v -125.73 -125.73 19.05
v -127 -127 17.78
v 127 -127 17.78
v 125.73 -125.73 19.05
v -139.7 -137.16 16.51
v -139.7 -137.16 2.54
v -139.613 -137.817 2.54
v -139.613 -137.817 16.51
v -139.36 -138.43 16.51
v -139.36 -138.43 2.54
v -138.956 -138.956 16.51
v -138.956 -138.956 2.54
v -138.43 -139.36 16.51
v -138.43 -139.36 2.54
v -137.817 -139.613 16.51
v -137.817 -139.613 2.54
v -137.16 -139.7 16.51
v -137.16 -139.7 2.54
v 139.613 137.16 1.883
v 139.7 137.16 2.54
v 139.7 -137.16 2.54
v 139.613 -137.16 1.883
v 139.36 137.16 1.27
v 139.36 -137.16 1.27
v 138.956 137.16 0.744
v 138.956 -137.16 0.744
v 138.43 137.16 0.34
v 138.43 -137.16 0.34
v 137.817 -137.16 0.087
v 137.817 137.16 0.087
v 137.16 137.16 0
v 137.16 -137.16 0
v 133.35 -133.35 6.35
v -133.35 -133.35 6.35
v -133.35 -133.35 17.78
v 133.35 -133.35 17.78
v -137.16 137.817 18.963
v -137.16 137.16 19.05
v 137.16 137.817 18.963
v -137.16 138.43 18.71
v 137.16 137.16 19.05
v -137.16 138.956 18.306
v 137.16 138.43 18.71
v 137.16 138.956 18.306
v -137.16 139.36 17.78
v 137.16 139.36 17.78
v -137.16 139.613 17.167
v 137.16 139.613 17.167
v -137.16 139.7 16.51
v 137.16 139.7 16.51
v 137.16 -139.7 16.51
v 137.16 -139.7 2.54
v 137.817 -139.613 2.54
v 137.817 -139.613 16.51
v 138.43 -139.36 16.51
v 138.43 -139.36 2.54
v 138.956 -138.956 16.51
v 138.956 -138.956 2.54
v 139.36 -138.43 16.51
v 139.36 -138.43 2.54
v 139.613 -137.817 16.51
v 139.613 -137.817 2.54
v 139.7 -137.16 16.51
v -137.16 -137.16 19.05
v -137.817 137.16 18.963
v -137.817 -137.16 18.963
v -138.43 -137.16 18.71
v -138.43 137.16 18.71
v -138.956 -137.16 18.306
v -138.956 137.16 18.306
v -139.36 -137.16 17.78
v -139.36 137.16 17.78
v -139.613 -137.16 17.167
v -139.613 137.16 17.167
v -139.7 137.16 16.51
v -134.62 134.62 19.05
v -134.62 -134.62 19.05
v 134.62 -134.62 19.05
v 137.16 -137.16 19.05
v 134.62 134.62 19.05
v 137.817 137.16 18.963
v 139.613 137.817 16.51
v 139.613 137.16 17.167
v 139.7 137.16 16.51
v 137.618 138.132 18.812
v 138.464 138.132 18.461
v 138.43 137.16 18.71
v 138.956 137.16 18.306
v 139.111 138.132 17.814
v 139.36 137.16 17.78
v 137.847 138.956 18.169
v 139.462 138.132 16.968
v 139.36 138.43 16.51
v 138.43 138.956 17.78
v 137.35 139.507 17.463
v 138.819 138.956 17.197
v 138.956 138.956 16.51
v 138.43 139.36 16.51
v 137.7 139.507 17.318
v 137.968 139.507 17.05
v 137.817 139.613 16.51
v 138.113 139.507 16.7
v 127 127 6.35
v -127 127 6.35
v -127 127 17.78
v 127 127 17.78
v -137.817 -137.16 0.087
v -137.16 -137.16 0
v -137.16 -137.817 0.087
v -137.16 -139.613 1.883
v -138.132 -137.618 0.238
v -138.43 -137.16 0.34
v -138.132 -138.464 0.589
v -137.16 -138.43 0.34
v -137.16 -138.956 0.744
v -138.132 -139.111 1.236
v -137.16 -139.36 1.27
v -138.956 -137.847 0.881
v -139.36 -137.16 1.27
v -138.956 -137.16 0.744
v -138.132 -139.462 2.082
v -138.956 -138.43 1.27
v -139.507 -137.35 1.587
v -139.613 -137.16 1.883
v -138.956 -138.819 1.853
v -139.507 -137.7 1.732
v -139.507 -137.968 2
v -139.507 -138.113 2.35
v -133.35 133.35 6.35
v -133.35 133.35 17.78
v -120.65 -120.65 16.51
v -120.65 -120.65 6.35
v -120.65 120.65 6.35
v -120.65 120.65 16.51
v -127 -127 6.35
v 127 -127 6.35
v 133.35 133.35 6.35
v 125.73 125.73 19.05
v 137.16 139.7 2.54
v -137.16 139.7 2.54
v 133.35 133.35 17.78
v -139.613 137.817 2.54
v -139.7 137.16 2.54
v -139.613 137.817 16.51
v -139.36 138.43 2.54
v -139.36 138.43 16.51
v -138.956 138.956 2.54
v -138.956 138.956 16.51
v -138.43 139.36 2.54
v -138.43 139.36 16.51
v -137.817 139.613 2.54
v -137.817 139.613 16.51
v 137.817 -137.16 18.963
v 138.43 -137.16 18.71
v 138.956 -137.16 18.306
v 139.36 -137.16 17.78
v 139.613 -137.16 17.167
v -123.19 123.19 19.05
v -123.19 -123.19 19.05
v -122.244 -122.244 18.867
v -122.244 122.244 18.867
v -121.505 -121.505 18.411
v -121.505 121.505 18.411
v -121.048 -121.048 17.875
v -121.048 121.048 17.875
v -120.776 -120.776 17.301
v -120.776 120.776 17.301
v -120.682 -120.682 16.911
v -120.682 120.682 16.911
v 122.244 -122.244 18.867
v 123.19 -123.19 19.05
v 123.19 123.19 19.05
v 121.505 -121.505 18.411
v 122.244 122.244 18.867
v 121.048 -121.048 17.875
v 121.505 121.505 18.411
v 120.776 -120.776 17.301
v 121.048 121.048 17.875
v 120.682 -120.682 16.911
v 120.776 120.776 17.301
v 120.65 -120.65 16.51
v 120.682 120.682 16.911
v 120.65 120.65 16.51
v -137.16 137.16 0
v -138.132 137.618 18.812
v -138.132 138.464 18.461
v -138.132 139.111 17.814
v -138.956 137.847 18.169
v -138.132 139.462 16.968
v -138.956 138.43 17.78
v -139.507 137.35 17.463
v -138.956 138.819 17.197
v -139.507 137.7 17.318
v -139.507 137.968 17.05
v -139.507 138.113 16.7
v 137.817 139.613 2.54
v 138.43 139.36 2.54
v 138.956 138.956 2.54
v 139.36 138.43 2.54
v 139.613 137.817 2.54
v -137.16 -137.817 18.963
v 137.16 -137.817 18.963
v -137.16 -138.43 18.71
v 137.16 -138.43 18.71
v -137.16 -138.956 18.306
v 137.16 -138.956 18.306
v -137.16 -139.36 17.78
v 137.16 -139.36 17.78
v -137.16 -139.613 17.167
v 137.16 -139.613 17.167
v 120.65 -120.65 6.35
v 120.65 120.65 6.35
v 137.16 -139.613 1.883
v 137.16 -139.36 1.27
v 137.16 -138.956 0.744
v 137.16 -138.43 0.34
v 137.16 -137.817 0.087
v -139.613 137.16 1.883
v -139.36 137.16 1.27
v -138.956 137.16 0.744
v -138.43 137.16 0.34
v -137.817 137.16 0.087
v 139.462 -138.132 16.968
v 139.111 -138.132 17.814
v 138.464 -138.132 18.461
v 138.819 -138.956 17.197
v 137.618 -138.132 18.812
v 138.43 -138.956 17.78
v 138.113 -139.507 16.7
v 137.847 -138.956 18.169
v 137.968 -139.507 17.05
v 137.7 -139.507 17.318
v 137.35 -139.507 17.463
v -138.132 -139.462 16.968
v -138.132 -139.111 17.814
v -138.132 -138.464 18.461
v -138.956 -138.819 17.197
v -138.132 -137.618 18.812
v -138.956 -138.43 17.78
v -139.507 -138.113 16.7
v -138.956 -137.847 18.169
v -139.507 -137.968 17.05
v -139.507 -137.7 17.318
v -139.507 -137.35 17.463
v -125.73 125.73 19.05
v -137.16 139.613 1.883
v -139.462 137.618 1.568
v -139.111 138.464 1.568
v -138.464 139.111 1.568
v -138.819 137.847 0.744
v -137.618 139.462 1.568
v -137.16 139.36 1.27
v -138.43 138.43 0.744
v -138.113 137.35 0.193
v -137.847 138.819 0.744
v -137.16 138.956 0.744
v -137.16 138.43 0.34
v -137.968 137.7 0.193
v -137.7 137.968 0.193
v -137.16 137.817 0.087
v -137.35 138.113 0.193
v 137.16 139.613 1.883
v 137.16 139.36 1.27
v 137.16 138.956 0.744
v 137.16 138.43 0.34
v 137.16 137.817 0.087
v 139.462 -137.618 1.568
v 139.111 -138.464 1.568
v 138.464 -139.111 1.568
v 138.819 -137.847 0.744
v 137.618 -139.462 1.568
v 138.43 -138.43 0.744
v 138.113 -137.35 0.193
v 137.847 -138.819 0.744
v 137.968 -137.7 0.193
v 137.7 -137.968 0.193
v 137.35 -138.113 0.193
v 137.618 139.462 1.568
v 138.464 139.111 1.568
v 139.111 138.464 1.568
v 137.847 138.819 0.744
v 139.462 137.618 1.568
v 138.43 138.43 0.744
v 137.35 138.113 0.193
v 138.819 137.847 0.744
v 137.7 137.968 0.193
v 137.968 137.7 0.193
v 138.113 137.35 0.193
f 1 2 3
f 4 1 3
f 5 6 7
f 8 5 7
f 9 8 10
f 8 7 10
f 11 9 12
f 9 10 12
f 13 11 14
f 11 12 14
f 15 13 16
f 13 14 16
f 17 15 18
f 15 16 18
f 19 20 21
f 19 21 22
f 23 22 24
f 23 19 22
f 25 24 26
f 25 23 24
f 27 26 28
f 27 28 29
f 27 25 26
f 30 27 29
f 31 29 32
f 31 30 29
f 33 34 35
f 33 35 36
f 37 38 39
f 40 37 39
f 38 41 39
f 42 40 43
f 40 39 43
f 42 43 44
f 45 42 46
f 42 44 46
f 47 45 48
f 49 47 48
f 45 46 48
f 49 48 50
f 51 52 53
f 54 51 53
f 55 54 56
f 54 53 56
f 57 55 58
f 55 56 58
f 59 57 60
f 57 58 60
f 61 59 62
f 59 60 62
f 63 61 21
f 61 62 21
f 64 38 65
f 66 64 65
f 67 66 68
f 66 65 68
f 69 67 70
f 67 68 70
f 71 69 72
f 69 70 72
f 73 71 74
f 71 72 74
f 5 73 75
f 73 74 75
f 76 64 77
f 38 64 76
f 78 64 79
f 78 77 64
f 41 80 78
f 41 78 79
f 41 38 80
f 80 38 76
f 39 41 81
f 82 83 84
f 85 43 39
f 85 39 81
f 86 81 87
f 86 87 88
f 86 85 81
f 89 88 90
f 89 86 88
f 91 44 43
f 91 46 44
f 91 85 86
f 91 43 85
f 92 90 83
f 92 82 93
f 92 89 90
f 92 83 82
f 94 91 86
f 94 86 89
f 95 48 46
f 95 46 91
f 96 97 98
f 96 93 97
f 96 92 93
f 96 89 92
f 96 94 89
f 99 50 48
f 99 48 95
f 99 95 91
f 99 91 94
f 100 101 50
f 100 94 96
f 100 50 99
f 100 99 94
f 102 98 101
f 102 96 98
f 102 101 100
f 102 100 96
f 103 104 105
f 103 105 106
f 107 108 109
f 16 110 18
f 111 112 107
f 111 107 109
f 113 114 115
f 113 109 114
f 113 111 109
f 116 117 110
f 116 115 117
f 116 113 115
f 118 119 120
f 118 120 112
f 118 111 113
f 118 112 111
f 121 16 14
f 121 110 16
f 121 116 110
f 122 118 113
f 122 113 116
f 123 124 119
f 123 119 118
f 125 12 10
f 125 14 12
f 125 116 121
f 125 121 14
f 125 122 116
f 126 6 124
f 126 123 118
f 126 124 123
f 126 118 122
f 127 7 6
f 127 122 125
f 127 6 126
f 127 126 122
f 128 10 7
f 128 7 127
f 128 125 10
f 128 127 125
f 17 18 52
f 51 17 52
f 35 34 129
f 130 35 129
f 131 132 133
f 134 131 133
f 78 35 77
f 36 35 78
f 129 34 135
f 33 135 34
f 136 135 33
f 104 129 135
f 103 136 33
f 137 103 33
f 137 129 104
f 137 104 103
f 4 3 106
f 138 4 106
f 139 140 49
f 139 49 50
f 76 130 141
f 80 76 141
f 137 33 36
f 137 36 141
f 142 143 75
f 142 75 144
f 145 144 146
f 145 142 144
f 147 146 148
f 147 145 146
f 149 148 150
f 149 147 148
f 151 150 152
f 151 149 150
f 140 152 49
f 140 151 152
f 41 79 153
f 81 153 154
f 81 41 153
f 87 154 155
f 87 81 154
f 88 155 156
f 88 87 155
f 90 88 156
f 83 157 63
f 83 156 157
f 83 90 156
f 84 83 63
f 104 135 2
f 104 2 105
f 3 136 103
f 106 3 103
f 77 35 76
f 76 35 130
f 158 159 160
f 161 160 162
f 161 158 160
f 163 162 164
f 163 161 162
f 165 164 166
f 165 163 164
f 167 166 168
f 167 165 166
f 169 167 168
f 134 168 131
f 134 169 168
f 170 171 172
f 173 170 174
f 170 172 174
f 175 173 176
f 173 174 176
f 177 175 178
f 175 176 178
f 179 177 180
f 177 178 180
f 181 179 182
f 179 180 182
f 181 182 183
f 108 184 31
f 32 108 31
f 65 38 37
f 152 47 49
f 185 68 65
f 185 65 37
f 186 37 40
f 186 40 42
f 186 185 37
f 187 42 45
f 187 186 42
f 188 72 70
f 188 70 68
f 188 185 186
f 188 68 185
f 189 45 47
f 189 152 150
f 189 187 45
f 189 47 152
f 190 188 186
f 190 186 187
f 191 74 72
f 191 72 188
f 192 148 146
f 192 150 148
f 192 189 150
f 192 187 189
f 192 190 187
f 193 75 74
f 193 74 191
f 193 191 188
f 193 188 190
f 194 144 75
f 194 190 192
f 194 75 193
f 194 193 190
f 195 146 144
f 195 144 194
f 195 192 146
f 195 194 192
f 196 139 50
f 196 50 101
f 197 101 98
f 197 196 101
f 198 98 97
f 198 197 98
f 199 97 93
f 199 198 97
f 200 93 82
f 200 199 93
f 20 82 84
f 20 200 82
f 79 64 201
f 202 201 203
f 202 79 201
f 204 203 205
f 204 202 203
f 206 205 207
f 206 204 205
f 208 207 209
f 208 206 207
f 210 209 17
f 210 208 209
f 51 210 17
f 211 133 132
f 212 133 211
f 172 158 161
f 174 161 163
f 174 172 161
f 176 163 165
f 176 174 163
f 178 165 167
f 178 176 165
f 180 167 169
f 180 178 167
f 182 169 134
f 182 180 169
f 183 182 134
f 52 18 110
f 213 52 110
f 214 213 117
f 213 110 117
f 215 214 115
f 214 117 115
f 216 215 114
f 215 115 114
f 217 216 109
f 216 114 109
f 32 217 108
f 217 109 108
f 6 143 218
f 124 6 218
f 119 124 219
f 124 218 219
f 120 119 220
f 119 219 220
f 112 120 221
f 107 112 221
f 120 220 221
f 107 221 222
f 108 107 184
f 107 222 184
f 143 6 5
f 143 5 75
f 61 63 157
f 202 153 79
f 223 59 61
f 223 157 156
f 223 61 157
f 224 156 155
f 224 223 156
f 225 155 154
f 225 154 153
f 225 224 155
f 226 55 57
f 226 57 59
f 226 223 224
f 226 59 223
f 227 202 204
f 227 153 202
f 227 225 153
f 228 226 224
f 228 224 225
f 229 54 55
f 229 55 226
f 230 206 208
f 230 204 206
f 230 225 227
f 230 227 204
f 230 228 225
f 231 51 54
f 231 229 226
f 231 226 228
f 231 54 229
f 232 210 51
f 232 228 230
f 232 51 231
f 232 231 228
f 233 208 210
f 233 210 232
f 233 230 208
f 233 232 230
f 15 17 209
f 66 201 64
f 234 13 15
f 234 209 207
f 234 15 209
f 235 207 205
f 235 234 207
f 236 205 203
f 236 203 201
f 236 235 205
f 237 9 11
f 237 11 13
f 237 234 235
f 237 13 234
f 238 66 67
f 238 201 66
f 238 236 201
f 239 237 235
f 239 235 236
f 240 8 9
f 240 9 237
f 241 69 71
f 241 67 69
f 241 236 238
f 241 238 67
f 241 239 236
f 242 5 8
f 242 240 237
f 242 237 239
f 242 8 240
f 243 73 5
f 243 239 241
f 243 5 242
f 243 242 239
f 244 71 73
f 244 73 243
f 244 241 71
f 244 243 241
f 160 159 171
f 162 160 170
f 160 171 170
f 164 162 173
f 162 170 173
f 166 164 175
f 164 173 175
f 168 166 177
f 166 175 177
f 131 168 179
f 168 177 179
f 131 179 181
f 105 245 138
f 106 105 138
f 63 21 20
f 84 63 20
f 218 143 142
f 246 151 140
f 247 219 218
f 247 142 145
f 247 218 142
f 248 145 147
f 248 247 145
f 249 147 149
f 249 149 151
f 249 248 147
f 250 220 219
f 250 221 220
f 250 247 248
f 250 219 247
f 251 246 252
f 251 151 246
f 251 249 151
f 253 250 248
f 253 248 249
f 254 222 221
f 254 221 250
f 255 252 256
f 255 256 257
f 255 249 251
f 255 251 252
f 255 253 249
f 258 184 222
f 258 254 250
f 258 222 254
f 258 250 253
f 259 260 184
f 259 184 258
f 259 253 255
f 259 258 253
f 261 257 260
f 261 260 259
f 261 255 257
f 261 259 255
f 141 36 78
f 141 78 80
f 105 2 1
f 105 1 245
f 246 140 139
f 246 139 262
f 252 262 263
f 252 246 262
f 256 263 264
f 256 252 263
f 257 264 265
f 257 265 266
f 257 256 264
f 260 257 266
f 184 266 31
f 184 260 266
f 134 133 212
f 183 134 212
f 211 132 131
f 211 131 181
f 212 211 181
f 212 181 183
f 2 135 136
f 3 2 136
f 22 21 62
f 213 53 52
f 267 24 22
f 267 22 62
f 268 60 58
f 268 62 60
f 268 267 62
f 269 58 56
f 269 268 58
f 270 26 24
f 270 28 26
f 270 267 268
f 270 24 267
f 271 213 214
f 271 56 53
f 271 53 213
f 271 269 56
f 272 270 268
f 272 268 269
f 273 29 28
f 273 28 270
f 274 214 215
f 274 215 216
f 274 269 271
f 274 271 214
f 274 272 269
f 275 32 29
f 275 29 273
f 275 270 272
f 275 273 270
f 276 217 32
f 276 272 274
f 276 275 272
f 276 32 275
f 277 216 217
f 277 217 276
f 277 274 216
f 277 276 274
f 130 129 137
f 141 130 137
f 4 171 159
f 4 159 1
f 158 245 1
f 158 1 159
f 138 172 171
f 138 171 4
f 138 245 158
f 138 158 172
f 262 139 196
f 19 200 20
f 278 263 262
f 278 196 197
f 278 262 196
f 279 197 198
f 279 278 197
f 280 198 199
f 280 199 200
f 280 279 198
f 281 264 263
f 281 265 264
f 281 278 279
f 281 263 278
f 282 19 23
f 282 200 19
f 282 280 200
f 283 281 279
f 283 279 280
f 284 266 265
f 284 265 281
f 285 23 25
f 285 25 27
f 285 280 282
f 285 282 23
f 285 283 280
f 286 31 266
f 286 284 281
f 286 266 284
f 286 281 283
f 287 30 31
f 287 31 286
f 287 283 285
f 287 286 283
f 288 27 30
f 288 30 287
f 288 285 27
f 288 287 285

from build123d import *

# Parameters (mm, degrees)
F0_W         = 279.4
F0_H         = 279.4
F0_W_2       = 266.7
F0_H_2       = 266.7
F0_W_3       = 254
F0_H_3       = 254
F0_W_4       = 241.3
F0_H_4       = 241.3
F1_DEPTH     = 6.35
F2_DEPTH     = 19.05
F3_SIZE      = 1.27
F4_R         = 2.54
F5_T1_DEPTH  = 274.32
F5_T3_DEPTH  = 274.32
F5_T5_DEPTH  = 13.97
F5_S9_W      = 2.54
F5_S9_H      = 2.54
F5_T10_DEPTH = 2.54
F5_S15_W     = 2.54
F5_S15_H     = 2.54
F5_T16_DEPTH = 2.54
F5_S21_W     = 2.54
F5_S21_H     = 2.54
F5_T22_DEPTH = 2.54
F5_S27_W     = 2.54
F5_S27_H     = 2.54
F5_T28_DEPTH = 2.54
F5_S33_W     = 2.54
F5_S33_H     = 2.54
F5_T34_DEPTH = 2.54
F5_S39_W     = 2.54
F5_S39_H     = 2.54
F5_T40_DEPTH = 2.54
F5_S45_W     = 2.54
F5_S45_H     = 2.54
F5_T46_DEPTH = 2.54
F5_S51_W     = 2.54
F5_S51_H     = 2.54
F5_T52_DEPTH = 2.54


# Not quite as in the source:
# - a fillet or chamfer that OpenCascade refuses, or shapes differently, is made with other operations: its cross-section is extruded or revolved along the edge and cut away or added


with BuildPart() as f1:
    # F0 (on Top) → F1 (new body)
    with BuildSketch(Plane.XY):
        Rectangle(F0_W, F0_H)
        Rectangle(F0_W_2, F0_H_2, mode=Mode.SUBTRACT)
        Rectangle(F0_W_2, F0_H_2)
        Rectangle(F0_W_3, F0_H_3, mode=Mode.SUBTRACT)
        Rectangle(F0_W_3, F0_H_3)
        Rectangle(F0_W_4, F0_H_4, mode=Mode.SUBTRACT)
        Rectangle(F0_W_4, F0_H_4)
    extrude(amount=F1_DEPTH)

    # F0 (on Top) → F2 (join)
    with BuildSketch(Plane.XY):
        Rectangle(F0_W, F0_H)
        Rectangle(F0_W_2, F0_H_2, mode=Mode.SUBTRACT)
        Rectangle(F0_W_3, F0_H_3)
        Rectangle(F0_W_4, F0_H_4, mode=Mode.SUBTRACT)
    extrude(amount=F2_DEPTH)

    # F3
    f3_edges = [f1.edges().sort_by_distance(p)[0] for p in [
        (-127, 0, 19.05),
        (-133.35, 0, 19.05),
        (0, 133.35, 19.05),
        (0, 127, 19.05),
        (133.35, 0, 19.05),
        (127, 0, 19.05),
        (0, -127, 19.05),
        (0, -133.35, 19.05),
    ]]
    chamfer(f3_edges, length=F3_SIZE)

    # F4
    f4_edges = [f1.edges().sort_by_distance(p)[0] for p in [
        (-139.7, 0, 19.05),
        (0, 139.7, 19.05),
        (139.7, 0, 19.05),
        (0, -139.7, 19.05),
        (-120.65, 0, 19.05),
        (0, -120.65, 19.05),
        (120.65, 0, 19.05),
        (0, 120.65, 19.05),
    ]]
    fillet(f4_edges, radius=F4_R)

    # F5: fillet of radius 2.54 on 8 edges, made by hand

    # F5_s2 → F5_t1 (cut)
    with BuildSketch(Plane.YZ.offset(-137.16)):
        with BuildLine():
            ThreePointArc((139.7, 2.54), (138.9560512242, 0.7439487758), (137.16, 0))
            Line((137.16, 0), (139.7, 0))
            Line((139.7, 0), (139.7, 2.54))
        make_face()
        with BuildLine():
            ThreePointArc((-139.7, 2.54), (-138.9560512242, 0.7439487758), (-137.16, 0))
            Line((-137.16, 0), (-139.7, 0))
            Line((-139.7, 0), (-139.7, 2.54))
        make_face()
    extrude(amount=F5_T1_DEPTH, mode=Mode.SUBTRACT)

    # F5_s4 → F5_t3 (cut)
    with BuildSketch(Plane.XZ.offset(-137.16)):
        with BuildLine():
            ThreePointArc((-139.7, 2.54), (-138.9560512242, 0.7439487758), (-137.16, 0))
            Line((-137.16, 0), (-139.7, 0))
            Line((-139.7, 0), (-139.7, 2.54))
        make_face()
        with BuildLine():
            ThreePointArc((139.7, 2.54), (138.9560512242, 0.7439487758), (137.16, 0))
            Line((137.16, 0), (139.7, 0))
            Line((139.7, 0), (139.7, 2.54))
        make_face()
    extrude(amount=F5_T3_DEPTH, mode=Mode.SUBTRACT)

    # F5_s6 → F5_t5 (cut)
    with BuildSketch(Plane.XY.offset(2.54)):
        with BuildLine():
            ThreePointArc((137.16, 139.7), (138.9560512242, 138.9560512242), (139.7, 137.16))
            Line((139.7, 137.16), (139.7, 139.7))
            Line((139.7, 139.7), (137.16, 139.7))
        make_face()
        with BuildLine():
            ThreePointArc((-139.7, 137.16), (-138.9560512242, 138.9560512242), (-137.16, 139.7))
            Line((-137.16, 139.7), (-139.7, 139.7))
            Line((-139.7, 139.7), (-139.7, 137.16))
        make_face()
        with BuildLine():
            ThreePointArc((-139.7, -137.16), (-138.9560512242, -138.9560512242), (-137.16, -139.7))
            Line((-137.16, -139.7), (-139.7, -139.7))
            Line((-139.7, -139.7), (-139.7, -137.16))
        make_face()
        with BuildLine():
            ThreePointArc((137.16, -139.7), (138.9560512242, -138.9560512242), (139.7, -137.16))
            Line((139.7, -137.16), (139.7, -139.7))
            Line((139.7, -139.7), (137.16, -139.7))
        make_face()
    extrude(amount=F5_T5_DEPTH, mode=Mode.SUBTRACT)


with BuildPart() as f5_tool8:
    # F5_s9 → F5_t10 (new body)
    with BuildSketch(Plane.XZ.offset(137.16)):
        with Locations((138.43, 17.78)):
            Rectangle(F5_S9_W, F5_S9_H)
    extrude(amount=F5_T10_DEPTH)

    # F5_s11 → F5_t12 (revolve, cut)
    with BuildSketch(Plane(origin=(137.16, -137.16, 16.51), x_dir=(-0.7071067812, 0, -0.7071067812), z_dir=(-0.7071067812, 0, 0.7071067812))):
        with BuildLine():
            ThreePointArc((0, -2.54), (2.54, 0), (0, 2.54))
            Line((0, 2.54), (0, -2.54))
        make_face()
    revolve(axis=Axis((137.16, -137.16, 16.51), (0, -1, 0)), mode=Mode.SUBTRACT)


with BuildPart() as f1_1:
    add(f1.part)

    # F5_t7: cut F5_tool8
    add(f5_tool8.part, mode=Mode.SUBTRACT)


with BuildPart() as f5_tool14:
    # F5_s15 → F5_t16 (new body)
    with BuildSketch(Plane.YZ.offset(-137.16)):
        with Locations((-138.43, 17.78)):
            Rectangle(F5_S15_W, F5_S15_H)
    extrude(amount=-F5_T16_DEPTH)

    # F5_s17 → F5_t18 (revolve, cut)
    with BuildSketch(Plane(origin=(-137.16, -137.16, 16.51), x_dir=(0, 0.7071067812, -0.7071067812), z_dir=(0, 0.7071067812, 0.7071067812))):
        with BuildLine():
            ThreePointArc((0, -2.54), (2.54, 0), (0, 2.54))
            Line((0, 2.54), (0, -2.54))
        make_face()
    revolve(axis=Axis((-137.16, -137.16, 16.51), (-1, 0, 0)), mode=Mode.SUBTRACT)


with BuildPart() as f1_2:
    add(f1_1.part)

    # F5_t13: cut F5_tool14
    add(f5_tool14.part, mode=Mode.SUBTRACT)


with BuildPart() as f5_tool20:
    # F5_s21 → F5_t22 (new body)
    with BuildSketch(Plane.YZ.offset(-137.16)):
        with Locations((138.43, 17.78)):
            Rectangle(F5_S21_W, F5_S21_H)
    extrude(amount=-F5_T22_DEPTH)

    # F5_s23 → F5_t24 (revolve, cut)
    with BuildSketch(Plane(origin=(-137.16, 137.16, 16.51), x_dir=(0, -0.7071067812, -0.7071067812), z_dir=(0, 0.7071067812, -0.7071067812))):
        with BuildLine():
            ThreePointArc((0, -2.54), (2.54, 0), (0, 2.54))
            Line((0, 2.54), (0, -2.54))
        make_face()
    revolve(axis=Axis((-137.16, 137.16, 16.51), (-1, 0, 0)), mode=Mode.SUBTRACT)


with BuildPart() as f1_3:
    add(f1_2.part)

    # F5_t19: cut F5_tool20
    add(f5_tool20.part, mode=Mode.SUBTRACT)


with BuildPart() as f5_tool26:
    # F5_s27 → F5_t28 (new body)
    with BuildSketch(Plane.XZ.offset(-137.16)):
        with Locations((138.43, 17.78)):
            Rectangle(F5_S27_W, F5_S27_H)
    extrude(amount=-F5_T28_DEPTH)

    # F5_s29 → F5_t30 (revolve, cut)
    with BuildSketch(Plane(origin=(137.16, 137.16, 16.51), x_dir=(-0.7071067812, 0, -0.7071067812), z_dir=(0.7071067812, 0, -0.7071067812))):
        with BuildLine():
            ThreePointArc((0, -2.54), (2.54, 0), (0, 2.54))
            Line((0, 2.54), (0, -2.54))
        make_face()
    revolve(axis=Axis((137.16, 137.16, 16.51), (0, 1, 0)), mode=Mode.SUBTRACT)


with BuildPart() as f1_4:
    add(f1_3.part)

    # F5_t25: cut F5_tool26
    add(f5_tool26.part, mode=Mode.SUBTRACT)


with BuildPart() as f5_tool32:
    # F5_s33 → F5_t34 (new body)
    with BuildSketch(Plane.XY.offset(2.54)):
        with Locations((138.43, 138.43)):
            Rectangle(F5_S33_W, F5_S33_H)
    extrude(amount=-F5_T34_DEPTH)

    # F5_s35 → F5_t36 (revolve, cut)
    with BuildSketch(Plane(origin=(137.16, 137.16, 2.54), x_dir=(-0.7071067812, -0.7071067812, 0), z_dir=(0.7071067812, -0.7071067812, 0))):
        with BuildLine():
            ThreePointArc((0, -2.54), (2.54, 0), (0, 2.54))
            Line((0, 2.54), (0, -2.54))
        make_face()
    revolve(axis=Axis((137.16, 137.16, 2.54), (0, 0, -1)), mode=Mode.SUBTRACT)


with BuildPart() as f1_5:
    add(f1_4.part)

    # F5_t31: cut F5_tool32
    add(f5_tool32.part, mode=Mode.SUBTRACT)


with BuildPart() as f5_tool38:
    # F5_s39 → F5_t40 (new body)
    with BuildSketch(Plane.XY.offset(2.54)):
        with Locations((-138.43, 138.43)):
            Rectangle(F5_S39_W, F5_S39_H)
    extrude(amount=-F5_T40_DEPTH)

    # F5_s41 → F5_t42 (revolve, cut)
    with BuildSketch(Plane(origin=(-137.16, 137.16, 2.54), x_dir=(0.7071067812, -0.7071067812, 0), z_dir=(0.7071067812, 0.7071067812, 0))):
        with BuildLine():
            ThreePointArc((0, -2.54), (2.54, 0), (0, 2.54))
            Line((0, 2.54), (0, -2.54))
        make_face()
    revolve(axis=Axis((-137.16, 137.16, 2.54), (0, 0, -1)), mode=Mode.SUBTRACT)


with BuildPart() as f1_6:
    add(f1_5.part)

    # F5_t37: cut F5_tool38
    add(f5_tool38.part, mode=Mode.SUBTRACT)


with BuildPart() as f5_tool44:
    # F5_s45 → F5_t46 (new body)
    with BuildSketch(Plane.YZ.offset(-137.16)):
        with Locations((-138.43, 1.27)):
            Rectangle(F5_S45_W, F5_S45_H)
    extrude(amount=-F5_T46_DEPTH)

    # F5_s47 → F5_t48 (revolve, cut)
    with BuildSketch(Plane(origin=(-137.16, -137.16, 2.54), x_dir=(0, 0.7071067812, 0.7071067812), z_dir=(0, -0.7071067812, 0.7071067812))):
        with BuildLine():
            ThreePointArc((0, -2.54), (2.54, 0), (0, 2.54))
            Line((0, 2.54), (0, -2.54))
        make_face()
    revolve(axis=Axis((-137.16, -137.16, 2.54), (-1, 0, 0)), mode=Mode.SUBTRACT)


with BuildPart() as f1_7:
    add(f1_6.part)

    # F5_t43: cut F5_tool44
    add(f5_tool44.part, mode=Mode.SUBTRACT)


with BuildPart() as f5_tool50:
    # F5_s51 → F5_t52 (new body)
    with BuildSketch(Plane.XY.offset(2.54)):
        with Locations((138.43, -138.43)):
            Rectangle(F5_S51_W, F5_S51_H)
    extrude(amount=-F5_T52_DEPTH)

    # F5_s53 → F5_t54 (revolve, cut)
    with BuildSketch(Plane(origin=(137.16, -137.16, 2.54), x_dir=(-0.7071067812, 0.7071067812, 0), z_dir=(-0.7071067812, -0.7071067812, 0))):
        with BuildLine():
            ThreePointArc((0, -2.54), (2.54, 0), (0, 2.54))
            Line((0, 2.54), (0, -2.54))
        make_face()
    revolve(axis=Axis((137.16, -137.16, 2.54), (0, 0, -1)), mode=Mode.SUBTRACT)


with BuildPart() as f1_8:
    add(f1_7.part)

    # F5_t49: cut F5_tool50
    add(f5_tool50.part, mode=Mode.SUBTRACT)


solid = f1_8.part
